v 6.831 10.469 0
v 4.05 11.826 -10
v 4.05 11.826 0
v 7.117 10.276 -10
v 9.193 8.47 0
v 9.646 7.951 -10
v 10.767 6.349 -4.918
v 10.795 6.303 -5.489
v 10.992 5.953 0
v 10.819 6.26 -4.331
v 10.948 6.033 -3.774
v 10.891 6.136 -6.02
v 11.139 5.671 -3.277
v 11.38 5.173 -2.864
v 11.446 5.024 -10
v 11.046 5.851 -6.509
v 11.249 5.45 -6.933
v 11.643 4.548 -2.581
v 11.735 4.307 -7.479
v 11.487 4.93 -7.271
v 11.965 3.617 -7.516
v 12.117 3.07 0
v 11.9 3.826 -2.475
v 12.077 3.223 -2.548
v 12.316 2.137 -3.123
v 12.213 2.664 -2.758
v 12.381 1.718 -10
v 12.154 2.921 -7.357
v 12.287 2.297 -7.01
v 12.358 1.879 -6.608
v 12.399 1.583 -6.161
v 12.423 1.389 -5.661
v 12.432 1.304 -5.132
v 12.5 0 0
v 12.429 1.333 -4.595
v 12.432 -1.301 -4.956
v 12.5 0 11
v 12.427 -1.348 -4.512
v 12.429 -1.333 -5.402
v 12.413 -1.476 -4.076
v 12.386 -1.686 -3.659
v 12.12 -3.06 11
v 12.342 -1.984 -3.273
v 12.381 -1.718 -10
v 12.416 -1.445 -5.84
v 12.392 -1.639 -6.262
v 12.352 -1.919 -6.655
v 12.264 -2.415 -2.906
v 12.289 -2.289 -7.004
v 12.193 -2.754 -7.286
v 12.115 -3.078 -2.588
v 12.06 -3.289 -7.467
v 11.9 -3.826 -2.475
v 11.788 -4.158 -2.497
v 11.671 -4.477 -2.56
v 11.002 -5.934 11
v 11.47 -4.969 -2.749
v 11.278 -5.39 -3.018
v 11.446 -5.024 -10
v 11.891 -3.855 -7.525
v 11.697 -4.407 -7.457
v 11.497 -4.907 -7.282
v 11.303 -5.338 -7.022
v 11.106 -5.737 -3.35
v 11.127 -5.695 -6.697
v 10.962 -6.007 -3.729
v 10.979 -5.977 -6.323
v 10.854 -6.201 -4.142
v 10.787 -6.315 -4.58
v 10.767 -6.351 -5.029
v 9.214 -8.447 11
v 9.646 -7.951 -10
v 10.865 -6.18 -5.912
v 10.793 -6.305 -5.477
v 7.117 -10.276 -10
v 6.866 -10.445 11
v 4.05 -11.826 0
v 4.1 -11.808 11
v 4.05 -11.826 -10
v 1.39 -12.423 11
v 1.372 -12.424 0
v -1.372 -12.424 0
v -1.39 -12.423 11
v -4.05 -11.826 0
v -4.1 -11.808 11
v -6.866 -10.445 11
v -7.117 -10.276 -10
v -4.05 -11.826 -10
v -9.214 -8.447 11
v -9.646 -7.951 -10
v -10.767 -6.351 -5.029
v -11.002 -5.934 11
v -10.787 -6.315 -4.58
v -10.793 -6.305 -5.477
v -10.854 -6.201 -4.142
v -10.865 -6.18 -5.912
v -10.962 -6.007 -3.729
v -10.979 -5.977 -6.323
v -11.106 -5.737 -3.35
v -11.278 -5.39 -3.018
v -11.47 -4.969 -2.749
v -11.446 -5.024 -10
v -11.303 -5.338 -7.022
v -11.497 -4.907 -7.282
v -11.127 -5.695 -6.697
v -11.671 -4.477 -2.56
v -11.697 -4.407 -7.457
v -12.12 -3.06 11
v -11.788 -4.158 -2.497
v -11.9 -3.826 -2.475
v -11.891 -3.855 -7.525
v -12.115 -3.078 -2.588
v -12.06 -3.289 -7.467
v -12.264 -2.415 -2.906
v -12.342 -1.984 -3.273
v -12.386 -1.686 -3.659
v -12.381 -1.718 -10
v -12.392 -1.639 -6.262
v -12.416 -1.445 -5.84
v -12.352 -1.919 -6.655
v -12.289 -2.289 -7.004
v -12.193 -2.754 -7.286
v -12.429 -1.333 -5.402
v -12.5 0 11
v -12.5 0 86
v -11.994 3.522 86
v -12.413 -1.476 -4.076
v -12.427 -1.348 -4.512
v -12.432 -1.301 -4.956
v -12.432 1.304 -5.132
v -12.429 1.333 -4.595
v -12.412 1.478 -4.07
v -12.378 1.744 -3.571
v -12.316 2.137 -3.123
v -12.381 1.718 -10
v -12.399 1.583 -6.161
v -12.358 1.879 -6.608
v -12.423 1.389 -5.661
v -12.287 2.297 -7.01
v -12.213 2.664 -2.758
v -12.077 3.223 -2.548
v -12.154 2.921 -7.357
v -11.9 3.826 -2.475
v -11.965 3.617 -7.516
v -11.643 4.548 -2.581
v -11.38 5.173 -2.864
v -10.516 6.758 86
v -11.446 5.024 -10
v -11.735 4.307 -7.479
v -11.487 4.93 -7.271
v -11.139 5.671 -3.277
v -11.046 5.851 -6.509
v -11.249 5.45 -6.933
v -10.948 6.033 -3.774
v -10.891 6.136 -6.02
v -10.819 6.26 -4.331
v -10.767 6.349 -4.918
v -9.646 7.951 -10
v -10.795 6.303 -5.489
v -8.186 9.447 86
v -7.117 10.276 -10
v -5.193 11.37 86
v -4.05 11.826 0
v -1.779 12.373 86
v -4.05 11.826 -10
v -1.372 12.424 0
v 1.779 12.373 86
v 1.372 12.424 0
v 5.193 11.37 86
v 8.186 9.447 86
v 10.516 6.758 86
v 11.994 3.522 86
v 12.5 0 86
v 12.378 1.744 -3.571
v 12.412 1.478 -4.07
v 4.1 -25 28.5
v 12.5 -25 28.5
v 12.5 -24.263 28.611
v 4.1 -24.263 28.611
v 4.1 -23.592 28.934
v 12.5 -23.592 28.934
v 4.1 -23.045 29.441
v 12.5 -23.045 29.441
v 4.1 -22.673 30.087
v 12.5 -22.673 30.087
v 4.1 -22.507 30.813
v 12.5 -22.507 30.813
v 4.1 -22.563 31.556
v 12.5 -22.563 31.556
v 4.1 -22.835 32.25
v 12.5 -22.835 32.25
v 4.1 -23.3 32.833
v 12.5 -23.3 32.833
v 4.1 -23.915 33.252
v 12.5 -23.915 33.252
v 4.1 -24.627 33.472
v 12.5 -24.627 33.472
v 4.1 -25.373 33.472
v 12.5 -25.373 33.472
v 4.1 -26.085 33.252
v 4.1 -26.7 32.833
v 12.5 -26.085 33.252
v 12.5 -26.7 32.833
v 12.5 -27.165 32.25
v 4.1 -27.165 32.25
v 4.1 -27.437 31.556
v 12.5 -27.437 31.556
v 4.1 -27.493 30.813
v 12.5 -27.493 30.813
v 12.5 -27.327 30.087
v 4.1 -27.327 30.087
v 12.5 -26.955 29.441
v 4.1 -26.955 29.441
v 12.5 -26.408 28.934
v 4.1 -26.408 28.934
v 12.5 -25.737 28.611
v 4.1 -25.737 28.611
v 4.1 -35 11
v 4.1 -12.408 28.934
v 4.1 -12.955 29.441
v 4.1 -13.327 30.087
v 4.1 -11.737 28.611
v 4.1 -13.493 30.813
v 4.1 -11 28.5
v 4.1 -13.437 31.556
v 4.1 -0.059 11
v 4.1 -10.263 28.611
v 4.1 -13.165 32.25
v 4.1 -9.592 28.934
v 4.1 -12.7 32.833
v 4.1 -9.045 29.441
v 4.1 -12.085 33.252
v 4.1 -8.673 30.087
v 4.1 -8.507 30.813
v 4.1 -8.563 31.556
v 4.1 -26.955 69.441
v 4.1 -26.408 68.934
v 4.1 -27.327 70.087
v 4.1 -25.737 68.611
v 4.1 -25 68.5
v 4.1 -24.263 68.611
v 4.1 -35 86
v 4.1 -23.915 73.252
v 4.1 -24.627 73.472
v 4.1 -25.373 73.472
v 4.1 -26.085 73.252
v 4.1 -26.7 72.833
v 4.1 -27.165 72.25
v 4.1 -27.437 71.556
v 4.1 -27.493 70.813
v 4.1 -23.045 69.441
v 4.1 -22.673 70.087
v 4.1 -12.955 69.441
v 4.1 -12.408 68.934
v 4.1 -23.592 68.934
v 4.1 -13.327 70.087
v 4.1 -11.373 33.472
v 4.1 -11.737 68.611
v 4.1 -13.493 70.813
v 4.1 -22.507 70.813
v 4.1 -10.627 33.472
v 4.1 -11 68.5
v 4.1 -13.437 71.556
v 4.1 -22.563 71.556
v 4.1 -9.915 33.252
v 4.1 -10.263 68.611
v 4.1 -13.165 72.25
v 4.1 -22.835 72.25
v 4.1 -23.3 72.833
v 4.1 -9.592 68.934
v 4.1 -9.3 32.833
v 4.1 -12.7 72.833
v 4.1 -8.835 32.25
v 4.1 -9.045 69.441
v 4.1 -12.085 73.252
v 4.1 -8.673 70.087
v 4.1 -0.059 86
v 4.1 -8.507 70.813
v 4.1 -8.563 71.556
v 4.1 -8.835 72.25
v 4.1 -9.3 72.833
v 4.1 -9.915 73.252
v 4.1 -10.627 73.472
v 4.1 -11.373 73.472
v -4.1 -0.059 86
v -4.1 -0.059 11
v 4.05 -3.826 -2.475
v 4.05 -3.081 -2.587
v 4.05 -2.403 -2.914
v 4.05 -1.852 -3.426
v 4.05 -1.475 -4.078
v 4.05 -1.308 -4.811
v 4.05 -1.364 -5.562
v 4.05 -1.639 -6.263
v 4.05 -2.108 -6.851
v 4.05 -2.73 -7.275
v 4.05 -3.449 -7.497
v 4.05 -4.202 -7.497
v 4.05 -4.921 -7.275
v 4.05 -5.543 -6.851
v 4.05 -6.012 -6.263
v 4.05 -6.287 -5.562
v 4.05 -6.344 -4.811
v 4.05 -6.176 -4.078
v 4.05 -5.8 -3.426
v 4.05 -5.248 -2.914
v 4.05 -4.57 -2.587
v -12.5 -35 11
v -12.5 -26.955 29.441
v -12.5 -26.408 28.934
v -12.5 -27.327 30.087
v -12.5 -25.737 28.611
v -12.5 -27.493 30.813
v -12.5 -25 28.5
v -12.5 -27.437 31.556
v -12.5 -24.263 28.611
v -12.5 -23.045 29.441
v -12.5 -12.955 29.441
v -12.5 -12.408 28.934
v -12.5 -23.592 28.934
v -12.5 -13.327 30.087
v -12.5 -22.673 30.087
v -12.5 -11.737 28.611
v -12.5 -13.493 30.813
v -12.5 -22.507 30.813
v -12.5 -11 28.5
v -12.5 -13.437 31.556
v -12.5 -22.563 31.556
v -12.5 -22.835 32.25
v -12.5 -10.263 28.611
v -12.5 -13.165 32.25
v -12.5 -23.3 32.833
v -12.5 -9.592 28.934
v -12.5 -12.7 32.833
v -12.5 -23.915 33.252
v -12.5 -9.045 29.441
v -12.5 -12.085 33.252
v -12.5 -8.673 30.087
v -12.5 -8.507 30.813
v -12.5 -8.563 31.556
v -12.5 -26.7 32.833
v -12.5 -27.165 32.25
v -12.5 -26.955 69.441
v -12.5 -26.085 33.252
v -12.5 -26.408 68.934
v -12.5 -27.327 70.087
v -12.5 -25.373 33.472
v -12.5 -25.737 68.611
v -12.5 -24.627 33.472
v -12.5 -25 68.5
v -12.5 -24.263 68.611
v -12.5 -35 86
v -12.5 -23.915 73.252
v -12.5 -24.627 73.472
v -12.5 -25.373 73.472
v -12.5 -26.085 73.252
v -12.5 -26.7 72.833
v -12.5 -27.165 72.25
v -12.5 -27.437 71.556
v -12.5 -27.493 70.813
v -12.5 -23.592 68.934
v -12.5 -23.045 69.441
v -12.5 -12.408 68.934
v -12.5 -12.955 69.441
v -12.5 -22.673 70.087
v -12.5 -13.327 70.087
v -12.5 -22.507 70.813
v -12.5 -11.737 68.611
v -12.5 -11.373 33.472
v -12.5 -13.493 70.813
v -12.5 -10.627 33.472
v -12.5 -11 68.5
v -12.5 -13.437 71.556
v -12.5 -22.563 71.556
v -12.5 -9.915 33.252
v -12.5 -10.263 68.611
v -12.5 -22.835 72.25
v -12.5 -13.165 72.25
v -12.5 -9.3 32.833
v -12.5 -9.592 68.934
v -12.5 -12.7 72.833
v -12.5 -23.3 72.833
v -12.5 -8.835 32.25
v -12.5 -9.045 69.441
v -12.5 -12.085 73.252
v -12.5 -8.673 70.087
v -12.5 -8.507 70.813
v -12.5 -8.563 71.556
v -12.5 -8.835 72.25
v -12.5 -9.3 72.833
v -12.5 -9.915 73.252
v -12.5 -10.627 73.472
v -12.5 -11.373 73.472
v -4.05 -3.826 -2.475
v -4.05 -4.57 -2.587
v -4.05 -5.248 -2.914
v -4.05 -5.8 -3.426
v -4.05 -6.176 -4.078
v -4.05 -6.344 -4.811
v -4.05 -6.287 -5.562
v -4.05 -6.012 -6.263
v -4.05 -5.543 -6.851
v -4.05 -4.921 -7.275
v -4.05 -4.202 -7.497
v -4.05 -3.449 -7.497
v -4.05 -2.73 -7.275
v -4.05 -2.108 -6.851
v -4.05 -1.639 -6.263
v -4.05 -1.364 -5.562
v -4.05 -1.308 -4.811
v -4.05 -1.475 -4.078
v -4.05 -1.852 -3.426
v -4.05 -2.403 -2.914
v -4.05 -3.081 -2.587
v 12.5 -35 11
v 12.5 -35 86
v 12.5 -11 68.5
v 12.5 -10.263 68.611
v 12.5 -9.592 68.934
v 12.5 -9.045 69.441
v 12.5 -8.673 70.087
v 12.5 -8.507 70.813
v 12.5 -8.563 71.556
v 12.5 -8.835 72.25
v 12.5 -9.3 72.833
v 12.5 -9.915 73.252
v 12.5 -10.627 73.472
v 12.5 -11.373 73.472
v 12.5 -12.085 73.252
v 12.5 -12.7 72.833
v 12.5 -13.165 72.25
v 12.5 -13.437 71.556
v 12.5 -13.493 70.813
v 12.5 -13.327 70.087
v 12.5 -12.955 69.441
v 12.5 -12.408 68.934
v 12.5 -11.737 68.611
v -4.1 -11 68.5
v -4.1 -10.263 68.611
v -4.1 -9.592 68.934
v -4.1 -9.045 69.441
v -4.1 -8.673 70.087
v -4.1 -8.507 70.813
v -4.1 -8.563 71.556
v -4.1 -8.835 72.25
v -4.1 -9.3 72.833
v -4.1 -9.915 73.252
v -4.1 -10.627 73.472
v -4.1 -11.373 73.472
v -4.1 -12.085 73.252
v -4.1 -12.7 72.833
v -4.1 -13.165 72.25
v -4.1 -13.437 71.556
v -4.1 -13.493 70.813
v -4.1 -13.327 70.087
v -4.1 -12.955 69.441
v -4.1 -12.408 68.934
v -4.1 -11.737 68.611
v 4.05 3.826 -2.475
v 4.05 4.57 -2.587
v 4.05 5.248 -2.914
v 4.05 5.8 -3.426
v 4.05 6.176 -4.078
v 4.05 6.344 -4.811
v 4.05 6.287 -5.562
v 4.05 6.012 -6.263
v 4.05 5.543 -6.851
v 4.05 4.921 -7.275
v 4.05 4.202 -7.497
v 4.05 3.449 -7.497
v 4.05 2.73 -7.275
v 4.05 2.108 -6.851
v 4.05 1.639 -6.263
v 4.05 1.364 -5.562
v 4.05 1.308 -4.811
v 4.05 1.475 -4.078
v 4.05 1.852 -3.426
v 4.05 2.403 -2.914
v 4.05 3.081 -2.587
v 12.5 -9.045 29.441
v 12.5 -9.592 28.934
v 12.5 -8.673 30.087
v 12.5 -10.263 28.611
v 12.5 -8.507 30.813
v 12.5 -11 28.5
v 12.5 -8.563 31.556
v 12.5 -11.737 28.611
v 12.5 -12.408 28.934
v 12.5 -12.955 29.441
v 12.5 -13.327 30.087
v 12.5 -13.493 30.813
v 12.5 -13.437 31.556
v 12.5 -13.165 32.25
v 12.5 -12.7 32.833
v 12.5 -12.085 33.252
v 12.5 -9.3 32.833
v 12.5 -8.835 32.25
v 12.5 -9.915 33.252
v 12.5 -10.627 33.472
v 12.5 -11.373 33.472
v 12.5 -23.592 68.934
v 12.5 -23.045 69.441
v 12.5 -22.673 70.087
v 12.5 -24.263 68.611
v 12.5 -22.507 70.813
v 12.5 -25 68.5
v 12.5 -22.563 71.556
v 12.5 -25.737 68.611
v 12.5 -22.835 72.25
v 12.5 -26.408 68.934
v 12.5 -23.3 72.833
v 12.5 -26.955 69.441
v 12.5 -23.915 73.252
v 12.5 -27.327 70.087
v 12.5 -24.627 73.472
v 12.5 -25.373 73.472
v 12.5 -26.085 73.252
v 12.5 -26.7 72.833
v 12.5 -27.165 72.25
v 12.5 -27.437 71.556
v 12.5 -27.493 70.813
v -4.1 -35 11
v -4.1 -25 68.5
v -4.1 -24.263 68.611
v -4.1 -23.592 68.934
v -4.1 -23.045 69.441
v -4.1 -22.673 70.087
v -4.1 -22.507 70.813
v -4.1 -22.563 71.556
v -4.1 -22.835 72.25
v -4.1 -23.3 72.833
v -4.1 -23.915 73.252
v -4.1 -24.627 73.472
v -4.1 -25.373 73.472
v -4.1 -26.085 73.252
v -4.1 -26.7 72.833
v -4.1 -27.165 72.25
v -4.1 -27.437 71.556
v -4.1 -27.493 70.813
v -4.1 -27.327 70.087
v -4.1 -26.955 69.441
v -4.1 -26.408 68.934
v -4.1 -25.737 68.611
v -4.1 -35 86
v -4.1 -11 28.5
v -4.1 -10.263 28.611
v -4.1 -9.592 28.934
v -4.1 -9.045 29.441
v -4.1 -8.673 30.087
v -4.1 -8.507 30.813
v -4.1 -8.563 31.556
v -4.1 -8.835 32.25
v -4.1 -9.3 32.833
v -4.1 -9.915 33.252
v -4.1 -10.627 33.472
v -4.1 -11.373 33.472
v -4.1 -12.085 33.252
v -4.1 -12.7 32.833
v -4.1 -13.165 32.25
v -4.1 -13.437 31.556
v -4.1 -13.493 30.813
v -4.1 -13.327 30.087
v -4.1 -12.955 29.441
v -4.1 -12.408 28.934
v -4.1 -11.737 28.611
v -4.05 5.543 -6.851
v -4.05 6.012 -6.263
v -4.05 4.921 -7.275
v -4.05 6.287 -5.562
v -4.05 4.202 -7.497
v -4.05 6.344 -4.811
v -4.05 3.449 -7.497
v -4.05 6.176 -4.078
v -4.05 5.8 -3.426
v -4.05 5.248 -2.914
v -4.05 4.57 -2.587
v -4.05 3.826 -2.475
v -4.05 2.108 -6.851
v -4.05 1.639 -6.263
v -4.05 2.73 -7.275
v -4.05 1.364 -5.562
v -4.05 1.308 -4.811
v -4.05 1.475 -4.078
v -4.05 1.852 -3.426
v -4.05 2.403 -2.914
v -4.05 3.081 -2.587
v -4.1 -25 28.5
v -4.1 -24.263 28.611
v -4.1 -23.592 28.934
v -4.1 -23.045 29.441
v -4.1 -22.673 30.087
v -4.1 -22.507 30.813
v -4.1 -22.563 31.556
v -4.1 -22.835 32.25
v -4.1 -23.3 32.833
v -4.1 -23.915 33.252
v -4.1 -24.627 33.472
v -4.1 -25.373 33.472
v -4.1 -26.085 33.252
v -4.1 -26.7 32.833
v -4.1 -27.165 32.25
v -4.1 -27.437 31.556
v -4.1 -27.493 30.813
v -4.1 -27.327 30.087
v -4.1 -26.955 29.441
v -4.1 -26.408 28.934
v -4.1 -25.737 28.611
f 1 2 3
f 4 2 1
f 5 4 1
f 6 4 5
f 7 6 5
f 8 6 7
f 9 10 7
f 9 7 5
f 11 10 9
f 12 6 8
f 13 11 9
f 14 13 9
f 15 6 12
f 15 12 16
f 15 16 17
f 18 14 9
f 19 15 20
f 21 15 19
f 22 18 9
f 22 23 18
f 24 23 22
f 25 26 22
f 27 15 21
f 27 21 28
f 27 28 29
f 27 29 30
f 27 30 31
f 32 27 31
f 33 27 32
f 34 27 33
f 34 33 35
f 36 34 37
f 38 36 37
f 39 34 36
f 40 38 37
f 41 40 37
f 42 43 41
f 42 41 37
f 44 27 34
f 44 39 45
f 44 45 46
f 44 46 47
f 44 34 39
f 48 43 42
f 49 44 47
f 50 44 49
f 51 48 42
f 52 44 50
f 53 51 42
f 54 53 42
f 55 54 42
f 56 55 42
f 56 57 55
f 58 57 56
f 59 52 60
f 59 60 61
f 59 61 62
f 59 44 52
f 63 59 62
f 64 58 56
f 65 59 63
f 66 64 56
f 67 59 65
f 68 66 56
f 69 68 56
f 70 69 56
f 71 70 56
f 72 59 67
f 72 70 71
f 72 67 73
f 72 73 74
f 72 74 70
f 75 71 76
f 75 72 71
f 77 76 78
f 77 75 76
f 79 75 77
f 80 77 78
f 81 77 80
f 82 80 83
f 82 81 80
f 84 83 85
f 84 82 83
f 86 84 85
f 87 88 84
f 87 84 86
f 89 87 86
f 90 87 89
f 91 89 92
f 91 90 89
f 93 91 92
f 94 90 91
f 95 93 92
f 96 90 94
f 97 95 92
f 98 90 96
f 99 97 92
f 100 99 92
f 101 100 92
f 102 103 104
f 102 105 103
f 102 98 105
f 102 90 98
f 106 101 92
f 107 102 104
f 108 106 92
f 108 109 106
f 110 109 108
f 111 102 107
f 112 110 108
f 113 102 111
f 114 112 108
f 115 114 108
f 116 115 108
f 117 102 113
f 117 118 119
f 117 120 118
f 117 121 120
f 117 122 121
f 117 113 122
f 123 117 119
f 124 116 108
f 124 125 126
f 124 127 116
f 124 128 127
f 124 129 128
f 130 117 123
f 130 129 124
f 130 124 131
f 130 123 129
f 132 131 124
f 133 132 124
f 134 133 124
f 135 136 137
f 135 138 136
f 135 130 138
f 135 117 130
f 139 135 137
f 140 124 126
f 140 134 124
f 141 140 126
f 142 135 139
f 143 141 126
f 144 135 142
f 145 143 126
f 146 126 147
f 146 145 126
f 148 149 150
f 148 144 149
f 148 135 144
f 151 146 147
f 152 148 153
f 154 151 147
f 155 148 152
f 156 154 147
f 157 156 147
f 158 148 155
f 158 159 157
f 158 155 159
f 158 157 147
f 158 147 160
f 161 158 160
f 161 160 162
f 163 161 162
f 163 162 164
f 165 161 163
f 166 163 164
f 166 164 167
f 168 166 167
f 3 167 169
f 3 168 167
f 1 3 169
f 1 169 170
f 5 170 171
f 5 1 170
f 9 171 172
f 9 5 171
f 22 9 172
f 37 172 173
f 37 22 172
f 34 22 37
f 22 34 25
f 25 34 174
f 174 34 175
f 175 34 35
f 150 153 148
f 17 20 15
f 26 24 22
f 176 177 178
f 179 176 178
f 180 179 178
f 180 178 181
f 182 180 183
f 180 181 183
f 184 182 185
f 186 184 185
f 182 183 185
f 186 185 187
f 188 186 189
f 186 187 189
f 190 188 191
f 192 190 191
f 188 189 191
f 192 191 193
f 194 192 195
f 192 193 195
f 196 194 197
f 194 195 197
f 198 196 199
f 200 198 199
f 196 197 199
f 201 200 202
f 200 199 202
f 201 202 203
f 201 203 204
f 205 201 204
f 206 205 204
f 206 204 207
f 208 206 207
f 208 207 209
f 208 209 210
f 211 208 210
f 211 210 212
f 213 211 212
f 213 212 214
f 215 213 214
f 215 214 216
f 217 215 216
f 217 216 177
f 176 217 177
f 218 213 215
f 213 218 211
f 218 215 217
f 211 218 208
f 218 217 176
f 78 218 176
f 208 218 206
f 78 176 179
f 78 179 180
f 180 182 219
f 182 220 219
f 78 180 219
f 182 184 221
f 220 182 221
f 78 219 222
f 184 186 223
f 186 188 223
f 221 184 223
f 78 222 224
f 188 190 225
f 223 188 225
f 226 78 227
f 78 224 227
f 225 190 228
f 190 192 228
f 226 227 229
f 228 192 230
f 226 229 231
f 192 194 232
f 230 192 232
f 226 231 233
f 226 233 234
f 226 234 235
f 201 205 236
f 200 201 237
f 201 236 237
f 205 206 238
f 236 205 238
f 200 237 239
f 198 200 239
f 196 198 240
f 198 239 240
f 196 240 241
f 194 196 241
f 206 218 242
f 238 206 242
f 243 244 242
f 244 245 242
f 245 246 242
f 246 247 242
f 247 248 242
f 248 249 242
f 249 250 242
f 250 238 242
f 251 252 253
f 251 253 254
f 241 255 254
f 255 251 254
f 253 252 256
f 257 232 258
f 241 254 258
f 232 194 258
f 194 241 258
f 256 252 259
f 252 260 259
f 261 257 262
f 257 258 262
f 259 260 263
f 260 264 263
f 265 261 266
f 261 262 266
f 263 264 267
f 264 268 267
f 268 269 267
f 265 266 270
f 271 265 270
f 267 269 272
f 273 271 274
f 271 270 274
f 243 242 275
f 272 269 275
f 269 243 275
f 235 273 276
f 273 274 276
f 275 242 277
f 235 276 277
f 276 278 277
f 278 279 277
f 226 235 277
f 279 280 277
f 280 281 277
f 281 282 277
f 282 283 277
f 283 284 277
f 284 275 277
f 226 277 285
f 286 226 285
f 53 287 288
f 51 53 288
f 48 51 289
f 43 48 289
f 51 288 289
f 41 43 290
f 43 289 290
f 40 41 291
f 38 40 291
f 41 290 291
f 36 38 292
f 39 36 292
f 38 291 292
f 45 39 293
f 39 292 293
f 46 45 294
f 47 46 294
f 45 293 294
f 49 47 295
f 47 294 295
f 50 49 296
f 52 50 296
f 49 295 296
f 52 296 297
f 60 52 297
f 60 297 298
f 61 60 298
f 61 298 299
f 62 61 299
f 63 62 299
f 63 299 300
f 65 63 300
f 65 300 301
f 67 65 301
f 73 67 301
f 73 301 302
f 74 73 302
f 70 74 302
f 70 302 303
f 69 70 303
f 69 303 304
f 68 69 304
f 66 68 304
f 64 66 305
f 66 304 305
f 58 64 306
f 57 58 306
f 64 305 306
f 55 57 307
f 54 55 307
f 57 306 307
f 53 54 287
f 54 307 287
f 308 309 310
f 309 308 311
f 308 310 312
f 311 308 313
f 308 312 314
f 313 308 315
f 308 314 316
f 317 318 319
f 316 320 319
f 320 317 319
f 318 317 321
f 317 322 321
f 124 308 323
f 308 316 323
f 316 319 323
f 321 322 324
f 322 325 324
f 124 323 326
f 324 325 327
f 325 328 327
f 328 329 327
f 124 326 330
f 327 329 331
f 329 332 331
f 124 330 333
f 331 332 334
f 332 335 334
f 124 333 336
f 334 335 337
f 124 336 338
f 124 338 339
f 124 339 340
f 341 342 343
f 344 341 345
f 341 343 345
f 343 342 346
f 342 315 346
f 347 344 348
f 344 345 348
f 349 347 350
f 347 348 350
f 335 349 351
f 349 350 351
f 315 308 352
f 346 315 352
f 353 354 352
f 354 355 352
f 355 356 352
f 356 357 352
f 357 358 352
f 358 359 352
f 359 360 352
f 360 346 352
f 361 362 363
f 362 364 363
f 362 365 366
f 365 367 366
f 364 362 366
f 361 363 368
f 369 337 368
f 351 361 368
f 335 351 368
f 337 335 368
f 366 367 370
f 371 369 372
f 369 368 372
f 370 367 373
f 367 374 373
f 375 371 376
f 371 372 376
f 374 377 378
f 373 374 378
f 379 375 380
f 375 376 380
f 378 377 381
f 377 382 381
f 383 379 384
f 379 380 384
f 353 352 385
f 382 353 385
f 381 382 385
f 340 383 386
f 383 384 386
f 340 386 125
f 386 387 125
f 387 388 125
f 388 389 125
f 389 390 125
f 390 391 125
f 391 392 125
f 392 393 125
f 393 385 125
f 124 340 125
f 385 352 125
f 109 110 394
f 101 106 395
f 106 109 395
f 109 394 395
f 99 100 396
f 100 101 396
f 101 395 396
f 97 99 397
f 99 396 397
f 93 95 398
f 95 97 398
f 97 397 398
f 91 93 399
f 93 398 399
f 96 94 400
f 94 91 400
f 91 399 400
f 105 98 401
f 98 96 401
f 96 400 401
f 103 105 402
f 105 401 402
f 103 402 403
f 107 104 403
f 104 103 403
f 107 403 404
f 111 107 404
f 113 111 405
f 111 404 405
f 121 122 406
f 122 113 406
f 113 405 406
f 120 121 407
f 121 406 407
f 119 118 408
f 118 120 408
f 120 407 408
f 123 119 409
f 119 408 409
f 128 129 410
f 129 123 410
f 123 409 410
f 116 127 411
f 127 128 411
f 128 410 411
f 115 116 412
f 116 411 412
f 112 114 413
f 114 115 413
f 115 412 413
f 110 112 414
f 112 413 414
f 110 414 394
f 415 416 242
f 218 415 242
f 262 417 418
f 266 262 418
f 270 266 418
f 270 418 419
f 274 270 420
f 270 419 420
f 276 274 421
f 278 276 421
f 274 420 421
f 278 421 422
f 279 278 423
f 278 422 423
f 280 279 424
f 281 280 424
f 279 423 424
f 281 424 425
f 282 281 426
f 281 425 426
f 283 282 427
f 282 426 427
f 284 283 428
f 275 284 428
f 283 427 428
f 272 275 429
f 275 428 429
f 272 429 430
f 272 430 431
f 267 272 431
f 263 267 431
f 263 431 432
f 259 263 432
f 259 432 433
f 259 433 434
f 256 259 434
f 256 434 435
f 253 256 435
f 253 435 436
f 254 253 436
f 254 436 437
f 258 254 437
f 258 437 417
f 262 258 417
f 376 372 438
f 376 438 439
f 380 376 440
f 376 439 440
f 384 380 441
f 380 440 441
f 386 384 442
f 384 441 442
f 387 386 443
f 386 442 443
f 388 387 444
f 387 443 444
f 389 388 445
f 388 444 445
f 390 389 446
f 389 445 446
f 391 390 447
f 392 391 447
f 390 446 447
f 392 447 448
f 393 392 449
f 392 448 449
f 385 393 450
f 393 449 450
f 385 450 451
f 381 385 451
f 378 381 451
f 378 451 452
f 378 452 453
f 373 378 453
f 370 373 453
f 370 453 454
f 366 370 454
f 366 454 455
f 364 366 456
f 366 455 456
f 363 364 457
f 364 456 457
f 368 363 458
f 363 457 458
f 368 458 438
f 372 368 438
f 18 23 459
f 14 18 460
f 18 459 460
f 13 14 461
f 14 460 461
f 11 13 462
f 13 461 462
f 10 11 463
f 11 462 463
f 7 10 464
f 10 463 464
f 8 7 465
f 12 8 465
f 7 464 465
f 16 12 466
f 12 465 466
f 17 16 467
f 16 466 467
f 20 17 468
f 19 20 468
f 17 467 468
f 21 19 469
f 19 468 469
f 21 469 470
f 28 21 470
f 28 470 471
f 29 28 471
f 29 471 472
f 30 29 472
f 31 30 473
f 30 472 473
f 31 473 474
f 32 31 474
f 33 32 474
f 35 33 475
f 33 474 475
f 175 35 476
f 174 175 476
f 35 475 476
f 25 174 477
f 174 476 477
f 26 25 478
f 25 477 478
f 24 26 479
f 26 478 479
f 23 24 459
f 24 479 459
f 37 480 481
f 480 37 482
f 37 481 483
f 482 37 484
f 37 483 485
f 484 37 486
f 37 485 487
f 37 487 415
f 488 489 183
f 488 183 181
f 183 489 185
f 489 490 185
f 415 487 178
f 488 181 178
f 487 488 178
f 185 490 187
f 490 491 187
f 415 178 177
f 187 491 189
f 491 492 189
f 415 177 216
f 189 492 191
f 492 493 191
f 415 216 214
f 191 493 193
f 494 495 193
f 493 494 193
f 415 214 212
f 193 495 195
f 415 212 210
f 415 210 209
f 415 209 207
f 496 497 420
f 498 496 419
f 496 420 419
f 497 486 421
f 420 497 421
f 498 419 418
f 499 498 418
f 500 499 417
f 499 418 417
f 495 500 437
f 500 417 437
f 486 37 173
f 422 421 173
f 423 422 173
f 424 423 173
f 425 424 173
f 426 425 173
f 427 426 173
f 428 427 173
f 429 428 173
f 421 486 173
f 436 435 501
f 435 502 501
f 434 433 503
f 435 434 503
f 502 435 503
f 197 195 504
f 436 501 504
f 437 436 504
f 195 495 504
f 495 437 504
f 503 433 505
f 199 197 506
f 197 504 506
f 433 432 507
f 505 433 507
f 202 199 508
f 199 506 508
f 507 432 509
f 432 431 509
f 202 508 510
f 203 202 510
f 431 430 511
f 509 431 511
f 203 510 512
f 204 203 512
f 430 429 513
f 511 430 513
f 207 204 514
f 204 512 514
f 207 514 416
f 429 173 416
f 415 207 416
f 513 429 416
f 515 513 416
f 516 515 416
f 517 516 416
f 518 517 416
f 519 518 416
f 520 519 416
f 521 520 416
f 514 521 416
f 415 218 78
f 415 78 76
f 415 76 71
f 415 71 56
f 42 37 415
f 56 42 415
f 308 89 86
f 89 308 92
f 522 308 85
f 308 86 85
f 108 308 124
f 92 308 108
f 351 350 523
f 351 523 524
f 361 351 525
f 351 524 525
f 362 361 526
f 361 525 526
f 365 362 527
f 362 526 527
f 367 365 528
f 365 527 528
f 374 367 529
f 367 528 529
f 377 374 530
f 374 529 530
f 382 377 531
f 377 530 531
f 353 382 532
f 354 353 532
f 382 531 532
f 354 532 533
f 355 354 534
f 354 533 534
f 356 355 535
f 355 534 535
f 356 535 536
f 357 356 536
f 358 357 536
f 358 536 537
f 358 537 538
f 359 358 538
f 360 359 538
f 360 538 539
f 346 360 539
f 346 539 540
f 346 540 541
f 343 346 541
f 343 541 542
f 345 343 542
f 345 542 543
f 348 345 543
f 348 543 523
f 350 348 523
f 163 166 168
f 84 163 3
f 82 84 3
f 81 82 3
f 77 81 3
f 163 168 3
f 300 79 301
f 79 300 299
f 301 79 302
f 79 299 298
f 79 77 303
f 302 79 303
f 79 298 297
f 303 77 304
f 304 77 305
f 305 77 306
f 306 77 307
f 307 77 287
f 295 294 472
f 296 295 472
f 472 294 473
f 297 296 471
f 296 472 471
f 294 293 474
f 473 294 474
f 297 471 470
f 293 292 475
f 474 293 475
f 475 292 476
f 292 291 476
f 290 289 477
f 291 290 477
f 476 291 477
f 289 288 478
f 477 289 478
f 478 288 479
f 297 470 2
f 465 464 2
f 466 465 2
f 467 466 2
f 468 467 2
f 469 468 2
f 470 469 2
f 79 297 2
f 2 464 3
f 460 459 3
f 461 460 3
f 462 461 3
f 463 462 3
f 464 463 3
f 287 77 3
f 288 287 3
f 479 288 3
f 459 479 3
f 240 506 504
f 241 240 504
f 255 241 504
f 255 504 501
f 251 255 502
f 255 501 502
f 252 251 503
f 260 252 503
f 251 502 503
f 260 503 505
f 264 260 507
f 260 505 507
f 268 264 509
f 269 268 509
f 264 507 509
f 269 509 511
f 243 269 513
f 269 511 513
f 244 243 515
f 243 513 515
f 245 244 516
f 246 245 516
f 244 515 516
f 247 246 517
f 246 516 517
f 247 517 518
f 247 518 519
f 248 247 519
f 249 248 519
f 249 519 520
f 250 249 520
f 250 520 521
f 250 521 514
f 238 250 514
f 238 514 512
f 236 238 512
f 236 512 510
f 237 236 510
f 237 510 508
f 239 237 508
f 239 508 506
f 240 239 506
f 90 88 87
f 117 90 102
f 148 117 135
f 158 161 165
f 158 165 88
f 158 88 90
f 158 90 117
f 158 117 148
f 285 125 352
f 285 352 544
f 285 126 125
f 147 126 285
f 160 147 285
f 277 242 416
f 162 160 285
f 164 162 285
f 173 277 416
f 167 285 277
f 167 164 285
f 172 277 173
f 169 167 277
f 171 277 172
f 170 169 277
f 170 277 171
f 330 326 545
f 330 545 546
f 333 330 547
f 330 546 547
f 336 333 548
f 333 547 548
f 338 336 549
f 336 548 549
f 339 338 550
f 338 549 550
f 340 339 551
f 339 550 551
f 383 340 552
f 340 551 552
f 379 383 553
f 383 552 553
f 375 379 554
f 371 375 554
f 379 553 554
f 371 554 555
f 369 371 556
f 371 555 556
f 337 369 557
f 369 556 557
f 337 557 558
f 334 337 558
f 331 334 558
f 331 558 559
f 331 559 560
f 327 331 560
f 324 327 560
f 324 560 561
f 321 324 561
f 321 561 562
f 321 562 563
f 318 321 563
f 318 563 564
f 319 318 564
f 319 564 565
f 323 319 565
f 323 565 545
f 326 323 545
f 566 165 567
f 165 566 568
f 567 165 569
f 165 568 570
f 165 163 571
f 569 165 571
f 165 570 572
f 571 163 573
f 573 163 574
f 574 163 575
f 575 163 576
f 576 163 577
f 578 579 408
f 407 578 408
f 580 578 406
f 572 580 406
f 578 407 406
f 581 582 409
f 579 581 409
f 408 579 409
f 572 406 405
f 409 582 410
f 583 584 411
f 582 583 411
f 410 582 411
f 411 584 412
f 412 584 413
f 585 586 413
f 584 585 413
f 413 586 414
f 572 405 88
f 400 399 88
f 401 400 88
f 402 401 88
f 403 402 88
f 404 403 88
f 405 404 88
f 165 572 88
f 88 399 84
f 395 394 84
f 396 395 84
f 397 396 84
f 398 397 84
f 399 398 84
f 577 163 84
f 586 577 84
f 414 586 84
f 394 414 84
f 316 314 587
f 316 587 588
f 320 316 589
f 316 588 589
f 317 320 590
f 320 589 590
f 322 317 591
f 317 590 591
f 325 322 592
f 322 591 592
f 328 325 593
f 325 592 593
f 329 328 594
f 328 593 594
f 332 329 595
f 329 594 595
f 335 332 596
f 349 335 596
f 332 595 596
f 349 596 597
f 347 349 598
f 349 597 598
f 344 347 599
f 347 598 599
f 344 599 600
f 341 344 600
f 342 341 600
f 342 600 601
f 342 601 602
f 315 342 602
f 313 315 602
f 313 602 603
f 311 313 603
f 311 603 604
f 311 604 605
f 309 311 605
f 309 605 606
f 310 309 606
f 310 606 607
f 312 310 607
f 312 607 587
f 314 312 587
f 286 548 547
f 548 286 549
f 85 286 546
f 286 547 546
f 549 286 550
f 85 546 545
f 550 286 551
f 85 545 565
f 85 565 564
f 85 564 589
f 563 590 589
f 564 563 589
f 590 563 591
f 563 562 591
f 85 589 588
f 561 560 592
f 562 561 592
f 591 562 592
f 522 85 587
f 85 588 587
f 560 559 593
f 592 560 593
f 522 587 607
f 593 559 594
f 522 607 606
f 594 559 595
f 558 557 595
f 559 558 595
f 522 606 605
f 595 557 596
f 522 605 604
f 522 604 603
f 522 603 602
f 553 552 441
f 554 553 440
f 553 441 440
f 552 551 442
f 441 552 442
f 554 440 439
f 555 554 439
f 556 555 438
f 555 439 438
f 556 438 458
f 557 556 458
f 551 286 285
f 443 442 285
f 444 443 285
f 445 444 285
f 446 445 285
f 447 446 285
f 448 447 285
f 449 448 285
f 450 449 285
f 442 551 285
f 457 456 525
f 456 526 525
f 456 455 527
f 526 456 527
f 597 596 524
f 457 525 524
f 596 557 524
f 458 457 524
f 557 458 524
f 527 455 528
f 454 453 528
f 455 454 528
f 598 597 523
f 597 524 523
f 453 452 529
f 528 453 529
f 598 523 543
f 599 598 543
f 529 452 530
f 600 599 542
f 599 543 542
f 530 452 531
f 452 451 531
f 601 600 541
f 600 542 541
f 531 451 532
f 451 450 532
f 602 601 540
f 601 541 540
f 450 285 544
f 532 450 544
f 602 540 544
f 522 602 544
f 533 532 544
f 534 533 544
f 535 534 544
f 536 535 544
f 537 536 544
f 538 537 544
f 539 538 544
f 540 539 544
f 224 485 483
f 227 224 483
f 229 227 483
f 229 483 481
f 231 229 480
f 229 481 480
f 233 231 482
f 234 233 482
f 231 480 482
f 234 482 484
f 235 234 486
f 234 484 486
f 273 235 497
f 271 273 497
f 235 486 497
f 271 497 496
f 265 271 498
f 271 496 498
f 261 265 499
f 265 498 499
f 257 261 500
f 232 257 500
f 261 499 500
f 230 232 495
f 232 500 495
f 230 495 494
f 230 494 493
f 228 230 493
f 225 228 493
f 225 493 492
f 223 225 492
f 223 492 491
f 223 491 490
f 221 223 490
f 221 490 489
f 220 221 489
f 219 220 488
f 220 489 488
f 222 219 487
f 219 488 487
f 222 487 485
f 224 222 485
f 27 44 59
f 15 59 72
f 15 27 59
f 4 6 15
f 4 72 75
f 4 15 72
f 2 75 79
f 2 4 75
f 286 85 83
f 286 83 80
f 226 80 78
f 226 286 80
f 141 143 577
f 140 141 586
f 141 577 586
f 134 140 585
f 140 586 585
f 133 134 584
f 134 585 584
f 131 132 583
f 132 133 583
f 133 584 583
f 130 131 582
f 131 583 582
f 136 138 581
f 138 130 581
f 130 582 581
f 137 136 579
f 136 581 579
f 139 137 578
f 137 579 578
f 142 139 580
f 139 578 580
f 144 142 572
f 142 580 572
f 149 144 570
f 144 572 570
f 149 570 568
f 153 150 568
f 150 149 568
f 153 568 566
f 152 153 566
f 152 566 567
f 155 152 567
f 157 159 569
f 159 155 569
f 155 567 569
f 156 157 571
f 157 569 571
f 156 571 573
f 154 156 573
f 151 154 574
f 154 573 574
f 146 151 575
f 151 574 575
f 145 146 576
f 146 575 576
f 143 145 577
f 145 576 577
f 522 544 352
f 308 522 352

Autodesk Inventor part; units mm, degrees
ref_plane "YZ Plane" through (0, 0, 0) normal (1, 0, 0) x (0, 1, 0)
ref_plane "XZ Plane" through (0, 0, 0) normal (0, 1, 0) x (-1, 0, 0)
ref_plane "XY Plane" through (0, 0, 0) normal (0, 0, 1) x (1, 0, 0)
sketch "Skizze1" plane through (0, 0, 0) normal (0, 0, 1) x (1, 0, 0)
  circle A0 centre (0, 0) radius 12.5
  dimension "d0" = 25
extrude "Extrusion1" add sketch "Skizze1" along normal blind 86
sketch "Skizze3" plane through (0, 0, 86) normal (0, 0, 1) x (1, 0, 0)
  circle A0 centre (0, 0) radius 12.5 projected
  line L0 (-12.5, 0) -> (12.5, 0)
  line L1 (12.5, 0) -> (12.5, -35)
  line L2 (12.5, -35) -> (-12.5, -35)
  line L3 (-12.5, -35) -> (-12.5, 0)
  dimension "d4" = 35
extrude "Extrusion2" add sketch "Skizze3" against normal blind 75 contours L1 L2 L3 A0
sketch "Skizze4" plane through (0, 0, 86) normal (0, 0, 1) x (1, 0, 0)
  line L0 (-4.1, -35.0592) -> (4.1, -35.0592)
  line L1 (4.1, -35.0592) -> (4.1, -0.0592)
  line L2 (4.1, -0.0592) -> (-4.1, -0.0592)
  line L3 (-4.1, -0.0592) -> (-4.1, -35.0592)
  line L4 (-12.5, 0) -> (-12.5, -35) projected
  line L5 (12.5, -35) -> (12.5, 0) projected
  point P0 (0, 0)
  dimension "d7" = 8.2
  dimension "d8" = 35
  dimension "d9" = 8.4
  dimension "d10" = 8.4
extrude "Extrusion3" cut sketch "Skizze4" against normal up to surface (75 mm away)
sketch "Skizze5" plane through (0, 0, 0) normal (0, 0, -1) x (-1, 0, 0)
  line L0 (-4.05, 11.8427) -> (4.05, 11.8427)
  line L1 (4.05, 11.8427) -> (4.05, -11.8427)
  line L2 (4.05, -11.8427) -> (-4.05, -11.8427)
  line L3 (-4.05, -11.8427) -> (-4.05, 11.8427)
  circle A0 centre (0, 0) radius 12.5
  point P0 (4.05, -11.8257)
  point P1 (4.05, 11.8257)
  point P2 (-4.05, 11.8257)
  point P3 (-4.05, -11.8257)
  dimension "d13" = 8.1
  dimension "d14" = 4.05
  dimension "d16" = 25
extrude "Extrusion4" add sketch "Skizze5" along normal blind 10 contours L3 A0 | A0 L1
sketch "Skizze6" plane through (4.05, -11.8257, 0) normal (-1, 0, 0) x (0, 0, 1)
  circle A0 centre (-5, 8) radius 2.525
  line L0 (-10, 23.6514) -> (-10, 0) projected
  circle A1 centre (-5, 15.6514) radius 2.525
  line L1 (0, 23.6514) -> (-10, 23.6514) projected
  line L2 (0, 0) -> (-10, 0) projected
  point P0 (0, 11.8257)
  dimension "d19" = 5.05
  dimension "d20" = 5
  dimension "d21" = 5.05
  dimension "d22" = 0
  dimension "d23" = 8
  dimension "d24" = 8
  dimension "d25" = 7.6514
extrude "Extrusion5" cut sketch "Skizze6" along normal mid plane 500
sketch "Skizze7" plane through (12.5, -35, 86) normal (1, 0, 0) x (0, 0, -1)
  circle A0 centre (55, 24) radius 2.5
  circle A1 centre (15, 24) radius 2.5
  circle A2 centre (15, 10) radius 2.5
  circle A3 centre (55, 10) radius 2.5
  line L0 (0, 0) -> (0, 35) projected
  line L1 (0, 0) -> (75, 0) projected
  line L2 (75, 35) -> (0, 35) projected
  point P0 (86, 35)
  dimension "d28" = 5
  dimension "d29" = 5
  dimension "d30" = 5
  dimension "d31" = 5
  dimension "d32" = 15
  dimension "d33" = 15
  dimension "d34" = 40
  dimension "d35" = 40
  dimension "d36" = 0
  dimension "d37" = 10
  dimension "d38" = 14
  dimension "d39" = 14
  dimension "d42" = 11
extrude "Extrusion6" cut sketch "Skizze7" against normal up to surface (25 mm away)
properties part number "Fahnenhalter"
